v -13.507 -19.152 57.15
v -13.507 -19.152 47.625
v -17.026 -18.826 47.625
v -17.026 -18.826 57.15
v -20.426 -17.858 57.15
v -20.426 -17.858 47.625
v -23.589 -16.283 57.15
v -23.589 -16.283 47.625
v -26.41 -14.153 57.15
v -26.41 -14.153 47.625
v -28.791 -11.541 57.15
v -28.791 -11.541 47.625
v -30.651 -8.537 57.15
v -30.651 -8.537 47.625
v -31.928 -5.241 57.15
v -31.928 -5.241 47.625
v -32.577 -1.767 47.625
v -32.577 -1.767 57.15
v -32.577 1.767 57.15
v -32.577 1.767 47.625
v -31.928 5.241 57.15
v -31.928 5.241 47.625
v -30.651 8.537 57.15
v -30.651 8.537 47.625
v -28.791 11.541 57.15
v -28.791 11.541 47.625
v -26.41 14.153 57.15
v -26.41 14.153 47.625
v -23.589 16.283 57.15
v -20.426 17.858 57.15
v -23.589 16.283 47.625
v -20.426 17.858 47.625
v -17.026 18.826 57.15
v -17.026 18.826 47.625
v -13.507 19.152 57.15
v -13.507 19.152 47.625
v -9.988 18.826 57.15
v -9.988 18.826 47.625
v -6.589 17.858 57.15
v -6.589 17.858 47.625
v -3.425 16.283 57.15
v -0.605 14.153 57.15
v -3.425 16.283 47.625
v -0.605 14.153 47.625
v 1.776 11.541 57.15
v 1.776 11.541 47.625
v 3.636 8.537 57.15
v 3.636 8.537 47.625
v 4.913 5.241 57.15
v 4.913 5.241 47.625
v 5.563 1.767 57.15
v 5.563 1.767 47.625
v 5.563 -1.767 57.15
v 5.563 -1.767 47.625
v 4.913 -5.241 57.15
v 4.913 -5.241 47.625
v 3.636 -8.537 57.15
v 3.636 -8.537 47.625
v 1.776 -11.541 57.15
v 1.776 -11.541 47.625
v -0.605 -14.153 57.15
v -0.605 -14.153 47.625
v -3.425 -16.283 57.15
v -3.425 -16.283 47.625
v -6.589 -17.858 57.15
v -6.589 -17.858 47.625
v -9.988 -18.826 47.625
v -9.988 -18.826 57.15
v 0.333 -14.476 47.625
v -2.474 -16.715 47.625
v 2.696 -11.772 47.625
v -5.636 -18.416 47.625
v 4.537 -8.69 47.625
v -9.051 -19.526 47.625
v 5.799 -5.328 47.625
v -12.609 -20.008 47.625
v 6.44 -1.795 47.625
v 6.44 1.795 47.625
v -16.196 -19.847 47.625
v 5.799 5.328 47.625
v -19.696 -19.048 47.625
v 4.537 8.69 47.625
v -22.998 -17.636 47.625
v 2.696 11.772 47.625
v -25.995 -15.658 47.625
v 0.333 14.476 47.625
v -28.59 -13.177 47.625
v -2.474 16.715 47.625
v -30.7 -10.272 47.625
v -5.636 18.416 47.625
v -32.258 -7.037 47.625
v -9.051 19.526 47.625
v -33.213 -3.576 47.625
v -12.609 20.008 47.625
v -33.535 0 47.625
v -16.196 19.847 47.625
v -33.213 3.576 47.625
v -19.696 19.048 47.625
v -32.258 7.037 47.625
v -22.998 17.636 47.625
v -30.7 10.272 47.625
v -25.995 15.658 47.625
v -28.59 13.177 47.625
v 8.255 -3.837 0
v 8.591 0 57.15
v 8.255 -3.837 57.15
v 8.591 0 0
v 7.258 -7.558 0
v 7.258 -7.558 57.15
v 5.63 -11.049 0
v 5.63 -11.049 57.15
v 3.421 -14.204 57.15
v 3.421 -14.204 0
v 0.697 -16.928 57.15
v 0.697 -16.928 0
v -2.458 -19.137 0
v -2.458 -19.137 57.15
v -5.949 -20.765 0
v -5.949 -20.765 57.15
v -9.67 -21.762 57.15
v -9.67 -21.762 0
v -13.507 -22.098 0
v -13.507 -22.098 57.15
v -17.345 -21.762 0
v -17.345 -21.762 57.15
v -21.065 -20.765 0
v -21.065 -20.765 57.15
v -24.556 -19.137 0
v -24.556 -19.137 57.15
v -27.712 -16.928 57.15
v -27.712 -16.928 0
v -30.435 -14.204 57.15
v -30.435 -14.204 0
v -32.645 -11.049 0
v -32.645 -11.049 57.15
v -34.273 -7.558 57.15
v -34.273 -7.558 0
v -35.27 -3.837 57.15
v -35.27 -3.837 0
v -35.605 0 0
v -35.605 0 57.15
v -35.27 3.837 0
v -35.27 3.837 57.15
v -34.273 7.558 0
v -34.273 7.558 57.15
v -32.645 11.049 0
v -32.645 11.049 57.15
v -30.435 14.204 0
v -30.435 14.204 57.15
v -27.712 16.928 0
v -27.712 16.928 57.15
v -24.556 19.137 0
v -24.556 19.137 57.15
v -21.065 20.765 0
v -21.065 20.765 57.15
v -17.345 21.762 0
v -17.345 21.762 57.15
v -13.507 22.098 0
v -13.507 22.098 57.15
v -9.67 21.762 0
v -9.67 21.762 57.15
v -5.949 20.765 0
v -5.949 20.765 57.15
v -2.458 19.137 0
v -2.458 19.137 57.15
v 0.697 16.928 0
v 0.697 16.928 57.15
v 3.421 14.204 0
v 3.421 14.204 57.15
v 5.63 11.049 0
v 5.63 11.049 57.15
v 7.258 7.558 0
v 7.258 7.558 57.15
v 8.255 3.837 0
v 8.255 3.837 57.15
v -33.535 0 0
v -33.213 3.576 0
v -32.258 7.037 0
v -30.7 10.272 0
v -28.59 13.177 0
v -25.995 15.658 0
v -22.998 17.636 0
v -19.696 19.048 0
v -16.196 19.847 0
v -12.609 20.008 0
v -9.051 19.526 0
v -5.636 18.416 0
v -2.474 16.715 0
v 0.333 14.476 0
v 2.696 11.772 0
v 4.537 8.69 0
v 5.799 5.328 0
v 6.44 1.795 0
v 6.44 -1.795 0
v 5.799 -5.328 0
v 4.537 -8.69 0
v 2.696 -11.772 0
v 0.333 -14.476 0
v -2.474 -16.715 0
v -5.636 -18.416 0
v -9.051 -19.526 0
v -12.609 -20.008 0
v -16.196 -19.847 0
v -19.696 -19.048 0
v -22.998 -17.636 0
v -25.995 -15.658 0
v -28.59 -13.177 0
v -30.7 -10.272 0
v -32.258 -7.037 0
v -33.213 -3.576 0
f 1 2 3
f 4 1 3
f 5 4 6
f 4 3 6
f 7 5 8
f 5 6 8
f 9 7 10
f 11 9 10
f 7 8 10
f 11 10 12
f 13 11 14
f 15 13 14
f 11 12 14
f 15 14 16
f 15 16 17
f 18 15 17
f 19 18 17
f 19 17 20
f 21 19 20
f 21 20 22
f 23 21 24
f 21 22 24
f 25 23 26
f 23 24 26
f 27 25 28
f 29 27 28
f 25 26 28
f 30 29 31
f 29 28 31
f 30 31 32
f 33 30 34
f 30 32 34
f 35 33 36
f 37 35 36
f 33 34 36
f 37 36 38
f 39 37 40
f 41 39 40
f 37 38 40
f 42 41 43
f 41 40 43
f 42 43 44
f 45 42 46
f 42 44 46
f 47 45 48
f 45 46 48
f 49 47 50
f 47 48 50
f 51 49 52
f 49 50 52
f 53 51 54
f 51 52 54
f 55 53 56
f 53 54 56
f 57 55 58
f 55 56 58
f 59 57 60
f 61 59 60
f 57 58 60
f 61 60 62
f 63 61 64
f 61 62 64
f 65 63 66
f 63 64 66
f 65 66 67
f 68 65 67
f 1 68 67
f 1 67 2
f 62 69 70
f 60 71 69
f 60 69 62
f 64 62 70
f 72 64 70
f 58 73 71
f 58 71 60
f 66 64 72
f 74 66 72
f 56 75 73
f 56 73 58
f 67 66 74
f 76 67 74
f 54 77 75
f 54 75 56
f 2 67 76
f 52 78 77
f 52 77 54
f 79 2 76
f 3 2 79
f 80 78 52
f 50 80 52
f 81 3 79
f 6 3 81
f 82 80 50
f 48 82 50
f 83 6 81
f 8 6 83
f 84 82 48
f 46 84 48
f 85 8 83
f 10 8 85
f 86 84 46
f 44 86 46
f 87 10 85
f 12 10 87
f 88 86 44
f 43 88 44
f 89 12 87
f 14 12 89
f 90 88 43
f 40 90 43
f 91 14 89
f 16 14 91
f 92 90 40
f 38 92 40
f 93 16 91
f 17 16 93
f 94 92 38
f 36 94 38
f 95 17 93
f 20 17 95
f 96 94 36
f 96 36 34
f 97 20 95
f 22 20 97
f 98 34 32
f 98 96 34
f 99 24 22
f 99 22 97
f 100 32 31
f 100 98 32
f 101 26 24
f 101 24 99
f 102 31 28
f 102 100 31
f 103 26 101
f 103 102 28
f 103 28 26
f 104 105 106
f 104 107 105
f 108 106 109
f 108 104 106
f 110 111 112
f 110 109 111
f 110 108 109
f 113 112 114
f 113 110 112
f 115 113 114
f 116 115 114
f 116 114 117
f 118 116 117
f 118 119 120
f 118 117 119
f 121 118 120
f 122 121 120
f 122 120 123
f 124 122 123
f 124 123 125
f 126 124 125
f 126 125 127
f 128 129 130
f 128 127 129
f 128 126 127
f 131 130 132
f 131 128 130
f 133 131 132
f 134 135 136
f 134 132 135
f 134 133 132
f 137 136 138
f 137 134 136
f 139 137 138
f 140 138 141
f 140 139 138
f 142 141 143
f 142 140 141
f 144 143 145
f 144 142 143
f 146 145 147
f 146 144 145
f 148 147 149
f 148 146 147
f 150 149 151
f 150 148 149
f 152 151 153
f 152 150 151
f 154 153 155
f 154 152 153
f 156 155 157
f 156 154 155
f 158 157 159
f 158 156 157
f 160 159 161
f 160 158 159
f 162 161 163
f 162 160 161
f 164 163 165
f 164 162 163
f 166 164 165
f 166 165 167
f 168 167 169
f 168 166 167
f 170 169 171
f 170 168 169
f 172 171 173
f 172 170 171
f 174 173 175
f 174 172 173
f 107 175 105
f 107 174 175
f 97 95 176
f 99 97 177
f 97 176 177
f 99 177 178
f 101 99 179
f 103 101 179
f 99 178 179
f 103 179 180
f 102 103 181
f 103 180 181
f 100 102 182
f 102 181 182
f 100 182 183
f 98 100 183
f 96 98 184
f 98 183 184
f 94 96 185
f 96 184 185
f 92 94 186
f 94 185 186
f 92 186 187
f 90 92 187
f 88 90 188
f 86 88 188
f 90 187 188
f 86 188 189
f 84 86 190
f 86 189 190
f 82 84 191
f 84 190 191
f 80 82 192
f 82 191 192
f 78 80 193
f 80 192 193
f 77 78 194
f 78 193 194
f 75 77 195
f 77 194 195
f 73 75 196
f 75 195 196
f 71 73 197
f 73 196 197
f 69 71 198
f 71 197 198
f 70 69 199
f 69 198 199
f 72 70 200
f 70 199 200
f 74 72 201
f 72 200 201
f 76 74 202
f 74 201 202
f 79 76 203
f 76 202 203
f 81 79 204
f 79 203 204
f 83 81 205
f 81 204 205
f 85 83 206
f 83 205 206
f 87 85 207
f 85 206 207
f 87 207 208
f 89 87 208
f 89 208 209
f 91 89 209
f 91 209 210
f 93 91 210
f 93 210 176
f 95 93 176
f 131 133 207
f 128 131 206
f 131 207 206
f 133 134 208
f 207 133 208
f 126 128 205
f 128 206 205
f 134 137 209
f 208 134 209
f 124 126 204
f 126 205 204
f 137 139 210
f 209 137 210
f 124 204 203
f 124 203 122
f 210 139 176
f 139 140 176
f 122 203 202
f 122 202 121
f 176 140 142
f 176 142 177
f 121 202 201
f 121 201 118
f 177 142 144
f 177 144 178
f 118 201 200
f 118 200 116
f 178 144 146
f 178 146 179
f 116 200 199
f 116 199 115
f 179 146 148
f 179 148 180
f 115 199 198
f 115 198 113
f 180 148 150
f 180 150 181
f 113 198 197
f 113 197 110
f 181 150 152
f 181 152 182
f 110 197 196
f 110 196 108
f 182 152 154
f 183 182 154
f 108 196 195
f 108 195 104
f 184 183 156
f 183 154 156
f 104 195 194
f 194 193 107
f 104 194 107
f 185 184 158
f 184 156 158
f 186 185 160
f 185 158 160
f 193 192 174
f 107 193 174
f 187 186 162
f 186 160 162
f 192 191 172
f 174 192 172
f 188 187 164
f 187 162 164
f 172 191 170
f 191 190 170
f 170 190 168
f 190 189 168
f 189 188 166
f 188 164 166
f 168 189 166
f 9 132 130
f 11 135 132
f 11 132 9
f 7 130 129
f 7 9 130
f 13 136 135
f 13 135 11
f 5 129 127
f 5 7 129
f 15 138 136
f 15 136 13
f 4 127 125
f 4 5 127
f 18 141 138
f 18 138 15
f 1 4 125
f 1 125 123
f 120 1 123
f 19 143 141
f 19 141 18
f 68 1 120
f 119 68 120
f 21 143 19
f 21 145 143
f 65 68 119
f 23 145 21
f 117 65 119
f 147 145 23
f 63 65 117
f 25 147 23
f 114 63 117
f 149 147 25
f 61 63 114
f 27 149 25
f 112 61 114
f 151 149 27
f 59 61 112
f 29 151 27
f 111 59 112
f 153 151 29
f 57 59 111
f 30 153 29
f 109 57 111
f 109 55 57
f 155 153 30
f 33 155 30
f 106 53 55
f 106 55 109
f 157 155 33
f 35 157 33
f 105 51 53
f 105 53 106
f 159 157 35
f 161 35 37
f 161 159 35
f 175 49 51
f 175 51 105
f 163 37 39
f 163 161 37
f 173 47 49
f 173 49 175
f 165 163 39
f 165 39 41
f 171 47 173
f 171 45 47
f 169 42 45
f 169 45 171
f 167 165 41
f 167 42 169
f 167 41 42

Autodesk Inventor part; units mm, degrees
ref_plane "YZ Plane" through (0, 0, 0) normal (1, 0, 0) x (0, 1, 0)
ref_plane "XZ Plane" through (0, 0, 0) normal (0, 1, 0) x (-1, 0, 0)
ref_plane "XY Plane" through (0, 0, 0) normal (0, 0, 1) x (1, 0, 0)
sketch "Sketch1" plane through (0, 0, 0) normal (0, 0, 1) x (1, 0, 0)
  circle A0 centre (-13.5074, 0) radius 22.098
  point P0 (0, 0)
  dimension "d0" = 44.196
extrude "Extrusion1" add sketch "Sketch1" along normal blind 57.15
sketch "Sketch2" plane through (-13.5074, 0, 57.15) normal (0, 0, 1) x (1, 0, 0)
  circle A0 centre (0, 0) radius 22.098 projected
  point P0 (13.5074, 0)
hole "Hole1" at (-13.5074, 0, 57.15) direction (0, 0, -1) diameter 38.3032 depth 10.16 tip angle 118 thread size "1 9/16-20 UN" class "2B" standard "ANSI Unified Screw Threads"
sketch "Sketch3" plane through (-13.5074, 0, 0) normal (0, 0, -1) x (-1, 0, 0)
  circle A0 centre (0, 0) radius 22.098 projected
  circle A1 centre (0, 0) radius 20.0279
  point P0 (-13.5074, 0)
  dimension "d10" = 40.0558
extrude "Extrusion2" cut sketch "Sketch3" against normal blind 47.625 contours A1
properties part number "JF-AT-JC0005" material "Acrylic, Clear"
